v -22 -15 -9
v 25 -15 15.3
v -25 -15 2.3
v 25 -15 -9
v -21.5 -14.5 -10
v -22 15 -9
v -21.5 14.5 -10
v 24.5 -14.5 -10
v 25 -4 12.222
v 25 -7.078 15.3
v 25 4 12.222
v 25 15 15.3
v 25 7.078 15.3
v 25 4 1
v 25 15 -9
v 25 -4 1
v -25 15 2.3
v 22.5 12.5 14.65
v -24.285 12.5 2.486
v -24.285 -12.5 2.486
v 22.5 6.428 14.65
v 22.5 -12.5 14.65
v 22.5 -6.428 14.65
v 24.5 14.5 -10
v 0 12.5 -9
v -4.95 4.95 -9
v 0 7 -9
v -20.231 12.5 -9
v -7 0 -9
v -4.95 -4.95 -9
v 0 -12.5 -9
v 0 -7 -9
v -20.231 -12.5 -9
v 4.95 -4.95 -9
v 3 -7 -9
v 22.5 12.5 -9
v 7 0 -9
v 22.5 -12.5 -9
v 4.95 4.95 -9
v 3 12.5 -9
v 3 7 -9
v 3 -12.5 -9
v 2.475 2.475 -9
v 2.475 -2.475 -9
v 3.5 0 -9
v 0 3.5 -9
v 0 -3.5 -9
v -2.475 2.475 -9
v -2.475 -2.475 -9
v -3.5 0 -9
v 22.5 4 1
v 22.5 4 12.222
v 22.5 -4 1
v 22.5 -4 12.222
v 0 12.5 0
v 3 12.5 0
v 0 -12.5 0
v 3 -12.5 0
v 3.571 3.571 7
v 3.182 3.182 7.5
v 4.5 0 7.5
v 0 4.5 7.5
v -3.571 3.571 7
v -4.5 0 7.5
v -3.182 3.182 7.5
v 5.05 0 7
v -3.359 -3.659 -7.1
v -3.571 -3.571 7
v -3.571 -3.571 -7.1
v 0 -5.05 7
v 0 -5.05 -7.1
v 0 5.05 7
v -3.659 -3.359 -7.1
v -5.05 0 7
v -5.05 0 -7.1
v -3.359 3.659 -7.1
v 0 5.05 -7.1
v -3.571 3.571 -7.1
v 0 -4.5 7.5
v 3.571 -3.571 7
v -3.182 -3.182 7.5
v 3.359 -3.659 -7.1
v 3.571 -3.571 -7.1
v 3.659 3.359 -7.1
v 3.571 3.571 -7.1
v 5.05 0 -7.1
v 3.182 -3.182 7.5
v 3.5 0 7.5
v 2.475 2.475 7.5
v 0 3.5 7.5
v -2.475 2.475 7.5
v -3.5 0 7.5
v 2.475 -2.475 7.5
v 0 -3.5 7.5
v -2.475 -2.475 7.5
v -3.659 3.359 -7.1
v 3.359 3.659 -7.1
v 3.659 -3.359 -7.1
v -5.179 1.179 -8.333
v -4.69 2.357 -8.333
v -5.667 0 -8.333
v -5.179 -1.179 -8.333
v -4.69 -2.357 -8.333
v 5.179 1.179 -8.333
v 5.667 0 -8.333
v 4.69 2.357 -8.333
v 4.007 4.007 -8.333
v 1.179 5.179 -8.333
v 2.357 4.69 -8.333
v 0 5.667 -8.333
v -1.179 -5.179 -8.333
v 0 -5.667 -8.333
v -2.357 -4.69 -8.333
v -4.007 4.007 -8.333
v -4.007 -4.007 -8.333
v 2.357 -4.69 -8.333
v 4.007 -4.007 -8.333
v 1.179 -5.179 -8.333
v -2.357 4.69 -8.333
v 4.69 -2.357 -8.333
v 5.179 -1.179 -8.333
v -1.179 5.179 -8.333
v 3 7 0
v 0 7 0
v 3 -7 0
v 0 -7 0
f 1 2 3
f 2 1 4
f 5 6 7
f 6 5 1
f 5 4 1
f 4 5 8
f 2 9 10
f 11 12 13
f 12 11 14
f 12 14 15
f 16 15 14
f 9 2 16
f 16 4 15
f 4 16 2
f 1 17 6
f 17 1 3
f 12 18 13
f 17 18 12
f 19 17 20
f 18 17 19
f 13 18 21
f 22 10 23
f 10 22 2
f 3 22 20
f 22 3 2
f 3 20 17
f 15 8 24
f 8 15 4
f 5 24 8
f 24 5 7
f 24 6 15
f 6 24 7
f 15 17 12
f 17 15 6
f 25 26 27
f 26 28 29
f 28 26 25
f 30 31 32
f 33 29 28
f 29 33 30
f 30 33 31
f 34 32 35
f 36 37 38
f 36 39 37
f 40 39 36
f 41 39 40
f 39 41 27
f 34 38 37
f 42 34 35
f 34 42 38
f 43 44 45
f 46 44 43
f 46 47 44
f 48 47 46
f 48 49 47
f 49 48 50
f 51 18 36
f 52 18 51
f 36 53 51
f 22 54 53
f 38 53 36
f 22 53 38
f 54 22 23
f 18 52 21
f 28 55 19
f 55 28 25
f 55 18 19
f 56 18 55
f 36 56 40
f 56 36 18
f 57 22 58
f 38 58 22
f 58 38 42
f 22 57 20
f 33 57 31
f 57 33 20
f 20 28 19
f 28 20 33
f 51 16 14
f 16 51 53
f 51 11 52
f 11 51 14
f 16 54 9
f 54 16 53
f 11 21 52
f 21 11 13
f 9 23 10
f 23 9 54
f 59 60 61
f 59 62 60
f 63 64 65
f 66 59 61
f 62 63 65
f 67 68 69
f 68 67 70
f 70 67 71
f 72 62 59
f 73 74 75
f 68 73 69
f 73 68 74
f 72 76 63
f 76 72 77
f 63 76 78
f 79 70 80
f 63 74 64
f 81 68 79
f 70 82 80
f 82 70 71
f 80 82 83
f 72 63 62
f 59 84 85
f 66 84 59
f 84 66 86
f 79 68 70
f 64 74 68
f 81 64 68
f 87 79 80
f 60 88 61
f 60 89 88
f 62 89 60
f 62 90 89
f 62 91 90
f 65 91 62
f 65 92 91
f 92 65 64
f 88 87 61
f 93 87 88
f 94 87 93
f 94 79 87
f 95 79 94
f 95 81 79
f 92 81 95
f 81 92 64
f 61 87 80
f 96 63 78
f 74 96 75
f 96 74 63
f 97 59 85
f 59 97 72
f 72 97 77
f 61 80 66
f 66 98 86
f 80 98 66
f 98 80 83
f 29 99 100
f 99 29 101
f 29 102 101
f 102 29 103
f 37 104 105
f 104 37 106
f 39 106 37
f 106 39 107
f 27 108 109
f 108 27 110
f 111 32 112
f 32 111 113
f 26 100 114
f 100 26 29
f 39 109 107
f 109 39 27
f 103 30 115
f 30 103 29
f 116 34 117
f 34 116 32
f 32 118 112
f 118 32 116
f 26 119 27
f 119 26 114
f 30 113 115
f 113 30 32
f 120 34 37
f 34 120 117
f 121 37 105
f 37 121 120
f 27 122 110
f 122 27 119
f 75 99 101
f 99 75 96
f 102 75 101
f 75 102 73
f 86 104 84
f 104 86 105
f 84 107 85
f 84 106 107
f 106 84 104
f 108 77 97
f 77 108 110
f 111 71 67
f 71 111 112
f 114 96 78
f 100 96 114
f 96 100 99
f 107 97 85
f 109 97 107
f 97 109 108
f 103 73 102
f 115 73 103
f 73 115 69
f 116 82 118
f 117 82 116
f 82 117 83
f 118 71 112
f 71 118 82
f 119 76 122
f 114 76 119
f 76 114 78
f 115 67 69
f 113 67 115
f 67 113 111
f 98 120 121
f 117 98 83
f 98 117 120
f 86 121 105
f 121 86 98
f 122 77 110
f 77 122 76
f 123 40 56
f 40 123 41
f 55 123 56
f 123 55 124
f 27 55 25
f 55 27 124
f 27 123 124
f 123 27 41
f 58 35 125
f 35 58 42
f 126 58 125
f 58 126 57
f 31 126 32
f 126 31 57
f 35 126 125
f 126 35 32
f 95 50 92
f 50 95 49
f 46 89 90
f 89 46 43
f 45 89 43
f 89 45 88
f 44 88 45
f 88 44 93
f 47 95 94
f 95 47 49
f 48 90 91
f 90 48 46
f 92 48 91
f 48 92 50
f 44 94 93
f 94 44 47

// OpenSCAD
extraheight = 7;
difference(){
    hull(){
        rotate([90]) translate([-25,-2])
        linear_extrude(30, center=true){
            polygon([[3,-extraheight],[50,-extraheight],[50,17.3], [0,4.3]]);
        }
        //bottom
        translate([1.5,0,-1.5-extraheight])
            cube([47-1,30-1,3], center=true);
    }
    rotate([90]) translate([-25,-4.5])
    linear_extrude(25, center=true){
        offset(r=-2.5)
        polygon([[3,-extraheight],[50,-extraheight],[50,30], [-3,10]]);
    }
     
    translate([10,0,16])
        cube([45,8,30], center=true);
    translate([10,0,16])
        rotate([45])
            cube([45,11,11], center=true);
    if( $preview){
    translate([0,100])
    cube(200, center=true);
    }
}
//pin
difference() {
    translate([0,0,-extraheight-2])
    {
        hull(){
            cylinder(h=7+extraheight+2, d=10.1, $fn=8);
            cylinder(h=7.5+extraheight+2, d=9, $fn=8);
        }
        cylinder(h=1, d1=14,d2=10, $fn=8);
        cylinder(h=2, d1=12,d2=10, $fn=8);
        
        translate([0,7,0])
            cube([3,6,extraheight+2]); 
        translate([0,-7-6,0])
            cube([3,6,extraheight+2]);
    }
    cylinder(h=100, d=7, $fn=8, center=true);
}
